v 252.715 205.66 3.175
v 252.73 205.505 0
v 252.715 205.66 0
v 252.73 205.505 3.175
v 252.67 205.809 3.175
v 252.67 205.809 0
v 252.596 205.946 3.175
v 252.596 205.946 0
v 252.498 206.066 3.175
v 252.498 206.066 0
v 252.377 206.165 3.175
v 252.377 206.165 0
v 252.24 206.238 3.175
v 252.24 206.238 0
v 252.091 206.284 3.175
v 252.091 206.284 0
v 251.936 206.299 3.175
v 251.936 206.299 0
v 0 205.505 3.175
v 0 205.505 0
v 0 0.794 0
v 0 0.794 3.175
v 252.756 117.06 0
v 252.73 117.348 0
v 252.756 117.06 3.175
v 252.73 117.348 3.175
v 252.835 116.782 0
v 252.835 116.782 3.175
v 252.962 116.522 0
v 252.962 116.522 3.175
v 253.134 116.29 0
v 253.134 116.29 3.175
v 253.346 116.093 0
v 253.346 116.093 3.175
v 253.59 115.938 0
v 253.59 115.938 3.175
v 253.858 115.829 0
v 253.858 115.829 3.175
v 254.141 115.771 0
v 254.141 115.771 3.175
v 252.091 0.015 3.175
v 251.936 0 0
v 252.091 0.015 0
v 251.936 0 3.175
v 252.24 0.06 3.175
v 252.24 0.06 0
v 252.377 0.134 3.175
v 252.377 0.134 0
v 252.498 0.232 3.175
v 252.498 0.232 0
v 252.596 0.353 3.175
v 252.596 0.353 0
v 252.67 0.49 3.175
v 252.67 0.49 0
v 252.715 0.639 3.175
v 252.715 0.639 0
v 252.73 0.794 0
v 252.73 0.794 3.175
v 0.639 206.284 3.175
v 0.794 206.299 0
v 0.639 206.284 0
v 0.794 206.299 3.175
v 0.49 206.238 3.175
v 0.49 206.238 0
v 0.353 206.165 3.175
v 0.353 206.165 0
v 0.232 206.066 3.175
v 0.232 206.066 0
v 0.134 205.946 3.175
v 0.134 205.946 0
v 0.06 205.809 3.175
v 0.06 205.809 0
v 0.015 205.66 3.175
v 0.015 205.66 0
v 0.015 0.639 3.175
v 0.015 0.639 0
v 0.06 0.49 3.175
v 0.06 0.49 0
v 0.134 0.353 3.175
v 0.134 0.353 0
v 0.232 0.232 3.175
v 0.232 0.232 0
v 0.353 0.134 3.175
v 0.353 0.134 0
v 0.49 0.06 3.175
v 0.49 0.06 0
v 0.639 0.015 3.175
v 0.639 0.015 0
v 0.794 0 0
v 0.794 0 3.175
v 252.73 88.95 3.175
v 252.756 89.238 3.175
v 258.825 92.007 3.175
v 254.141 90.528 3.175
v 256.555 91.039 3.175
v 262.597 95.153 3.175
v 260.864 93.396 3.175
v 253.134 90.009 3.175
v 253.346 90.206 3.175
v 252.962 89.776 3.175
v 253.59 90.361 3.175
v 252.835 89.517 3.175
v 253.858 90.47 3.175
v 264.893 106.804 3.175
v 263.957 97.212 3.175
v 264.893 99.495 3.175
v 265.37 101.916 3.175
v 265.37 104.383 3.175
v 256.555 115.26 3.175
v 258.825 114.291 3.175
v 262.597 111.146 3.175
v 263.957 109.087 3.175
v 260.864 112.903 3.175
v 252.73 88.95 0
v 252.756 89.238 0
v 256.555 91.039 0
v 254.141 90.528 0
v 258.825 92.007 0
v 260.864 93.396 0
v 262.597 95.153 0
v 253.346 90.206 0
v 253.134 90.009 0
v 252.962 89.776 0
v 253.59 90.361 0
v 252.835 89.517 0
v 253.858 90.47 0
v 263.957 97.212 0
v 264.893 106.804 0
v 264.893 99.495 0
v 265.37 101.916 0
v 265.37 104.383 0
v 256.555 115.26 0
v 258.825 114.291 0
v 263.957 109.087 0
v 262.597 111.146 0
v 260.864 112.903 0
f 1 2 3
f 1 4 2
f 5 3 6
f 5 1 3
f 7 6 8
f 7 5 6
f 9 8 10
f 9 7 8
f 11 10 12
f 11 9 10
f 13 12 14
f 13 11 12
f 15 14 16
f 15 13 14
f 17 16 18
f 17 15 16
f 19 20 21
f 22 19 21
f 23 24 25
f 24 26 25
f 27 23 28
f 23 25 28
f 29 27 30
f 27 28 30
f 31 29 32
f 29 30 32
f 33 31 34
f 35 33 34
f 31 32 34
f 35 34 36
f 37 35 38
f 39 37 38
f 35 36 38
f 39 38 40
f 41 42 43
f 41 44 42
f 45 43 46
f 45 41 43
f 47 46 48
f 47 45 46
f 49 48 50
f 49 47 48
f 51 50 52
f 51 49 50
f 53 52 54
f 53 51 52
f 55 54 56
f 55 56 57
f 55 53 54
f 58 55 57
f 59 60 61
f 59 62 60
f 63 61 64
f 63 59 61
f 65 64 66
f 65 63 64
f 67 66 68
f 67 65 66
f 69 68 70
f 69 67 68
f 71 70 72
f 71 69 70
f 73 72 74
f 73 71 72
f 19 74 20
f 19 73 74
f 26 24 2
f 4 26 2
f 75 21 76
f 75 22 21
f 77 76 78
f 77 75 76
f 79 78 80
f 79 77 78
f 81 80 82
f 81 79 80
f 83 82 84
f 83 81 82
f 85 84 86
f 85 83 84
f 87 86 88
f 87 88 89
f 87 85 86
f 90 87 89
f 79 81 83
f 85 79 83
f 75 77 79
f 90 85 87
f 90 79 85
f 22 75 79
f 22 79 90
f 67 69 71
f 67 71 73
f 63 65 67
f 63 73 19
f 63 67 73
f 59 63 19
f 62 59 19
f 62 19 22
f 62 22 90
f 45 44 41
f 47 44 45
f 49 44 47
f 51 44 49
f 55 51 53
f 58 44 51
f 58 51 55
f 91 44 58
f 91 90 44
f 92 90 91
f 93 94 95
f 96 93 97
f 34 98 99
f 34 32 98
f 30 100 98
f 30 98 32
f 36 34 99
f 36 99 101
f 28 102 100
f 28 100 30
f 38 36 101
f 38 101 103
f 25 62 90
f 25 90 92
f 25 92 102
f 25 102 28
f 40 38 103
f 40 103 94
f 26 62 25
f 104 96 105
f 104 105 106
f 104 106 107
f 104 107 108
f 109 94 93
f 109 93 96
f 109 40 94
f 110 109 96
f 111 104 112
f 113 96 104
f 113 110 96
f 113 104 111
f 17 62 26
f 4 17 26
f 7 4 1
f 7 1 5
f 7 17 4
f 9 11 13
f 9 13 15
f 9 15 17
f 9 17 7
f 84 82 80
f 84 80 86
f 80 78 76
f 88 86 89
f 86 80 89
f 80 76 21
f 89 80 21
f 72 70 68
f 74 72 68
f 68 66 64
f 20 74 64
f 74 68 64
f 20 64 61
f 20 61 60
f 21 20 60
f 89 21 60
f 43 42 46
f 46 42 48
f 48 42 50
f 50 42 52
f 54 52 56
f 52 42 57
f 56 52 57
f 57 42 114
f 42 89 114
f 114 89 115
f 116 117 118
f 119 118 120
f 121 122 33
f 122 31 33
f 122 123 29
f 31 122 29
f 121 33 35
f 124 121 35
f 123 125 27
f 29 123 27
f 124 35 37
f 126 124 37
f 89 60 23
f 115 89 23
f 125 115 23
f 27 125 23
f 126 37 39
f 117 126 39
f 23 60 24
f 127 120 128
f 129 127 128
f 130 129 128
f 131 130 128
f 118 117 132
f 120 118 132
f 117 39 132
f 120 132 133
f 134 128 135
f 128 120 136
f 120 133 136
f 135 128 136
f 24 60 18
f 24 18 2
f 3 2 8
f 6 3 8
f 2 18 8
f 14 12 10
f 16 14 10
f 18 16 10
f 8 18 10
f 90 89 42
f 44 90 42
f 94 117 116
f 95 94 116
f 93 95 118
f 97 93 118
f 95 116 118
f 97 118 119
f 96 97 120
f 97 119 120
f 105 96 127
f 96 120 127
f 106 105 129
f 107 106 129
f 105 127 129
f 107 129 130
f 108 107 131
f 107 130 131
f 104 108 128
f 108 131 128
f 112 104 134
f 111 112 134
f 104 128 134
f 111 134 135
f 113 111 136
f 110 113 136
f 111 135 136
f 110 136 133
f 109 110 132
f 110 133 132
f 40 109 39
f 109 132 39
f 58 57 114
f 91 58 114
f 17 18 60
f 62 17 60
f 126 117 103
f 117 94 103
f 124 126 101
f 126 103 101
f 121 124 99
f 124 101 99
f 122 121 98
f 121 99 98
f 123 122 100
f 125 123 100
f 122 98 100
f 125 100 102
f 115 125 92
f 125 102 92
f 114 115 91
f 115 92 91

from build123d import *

# Parameters (mm, degrees)
BOSS_EXTRUDE1_DEPTH = 3.175
FILLET1_R           = 0.79375
FILLET2_R           = 1.5875


# Read off the part's stored shape, not the designer's step: Boss-Extrude1
with BuildPart() as part:
    # Boss-Extrude1 outline → Boss-Extrude1 (new body)
    with BuildSketch(Plane.XY):
        with BuildLine():
            ThreePointArc((252.73, 90.4494), (265.43, 103.1494), (252.73, 115.8494))
            Line((252.73, 115.8494), (252.73, 206.2988))
            Line((252.73, 206.2988), (0, 206.2988))
            Line((0, 206.2988), (0, 0))
            Line((0, 0), (252.73, 0))
            Line((252.73, 0), (252.73, 90.4494))
        make_face()
    extrude(amount=BOSS_EXTRUDE1_DEPTH)

    # Fillet1
    fillet1_edges = [part.edges().sort_by_distance(p)[0] for p in [
        (252.73, 0, 1.5875),
        (0, 0, 1.5875),
        (0, 206.2988, 1.5875),
        (252.73, 206.2988, 1.5875),
    ]]
    fillet(fillet1_edges, radius=FILLET1_R)

    # Fillet2
    fillet2_edges = [part.edges().sort_by_distance(p)[0] for p in [
        (252.73, 90.4494, 1.5875),
        (252.73, 115.8494, 1.5875),
    ]]
    fillet(fillet2_edges, radius=FILLET2_R)


solid = part.part
